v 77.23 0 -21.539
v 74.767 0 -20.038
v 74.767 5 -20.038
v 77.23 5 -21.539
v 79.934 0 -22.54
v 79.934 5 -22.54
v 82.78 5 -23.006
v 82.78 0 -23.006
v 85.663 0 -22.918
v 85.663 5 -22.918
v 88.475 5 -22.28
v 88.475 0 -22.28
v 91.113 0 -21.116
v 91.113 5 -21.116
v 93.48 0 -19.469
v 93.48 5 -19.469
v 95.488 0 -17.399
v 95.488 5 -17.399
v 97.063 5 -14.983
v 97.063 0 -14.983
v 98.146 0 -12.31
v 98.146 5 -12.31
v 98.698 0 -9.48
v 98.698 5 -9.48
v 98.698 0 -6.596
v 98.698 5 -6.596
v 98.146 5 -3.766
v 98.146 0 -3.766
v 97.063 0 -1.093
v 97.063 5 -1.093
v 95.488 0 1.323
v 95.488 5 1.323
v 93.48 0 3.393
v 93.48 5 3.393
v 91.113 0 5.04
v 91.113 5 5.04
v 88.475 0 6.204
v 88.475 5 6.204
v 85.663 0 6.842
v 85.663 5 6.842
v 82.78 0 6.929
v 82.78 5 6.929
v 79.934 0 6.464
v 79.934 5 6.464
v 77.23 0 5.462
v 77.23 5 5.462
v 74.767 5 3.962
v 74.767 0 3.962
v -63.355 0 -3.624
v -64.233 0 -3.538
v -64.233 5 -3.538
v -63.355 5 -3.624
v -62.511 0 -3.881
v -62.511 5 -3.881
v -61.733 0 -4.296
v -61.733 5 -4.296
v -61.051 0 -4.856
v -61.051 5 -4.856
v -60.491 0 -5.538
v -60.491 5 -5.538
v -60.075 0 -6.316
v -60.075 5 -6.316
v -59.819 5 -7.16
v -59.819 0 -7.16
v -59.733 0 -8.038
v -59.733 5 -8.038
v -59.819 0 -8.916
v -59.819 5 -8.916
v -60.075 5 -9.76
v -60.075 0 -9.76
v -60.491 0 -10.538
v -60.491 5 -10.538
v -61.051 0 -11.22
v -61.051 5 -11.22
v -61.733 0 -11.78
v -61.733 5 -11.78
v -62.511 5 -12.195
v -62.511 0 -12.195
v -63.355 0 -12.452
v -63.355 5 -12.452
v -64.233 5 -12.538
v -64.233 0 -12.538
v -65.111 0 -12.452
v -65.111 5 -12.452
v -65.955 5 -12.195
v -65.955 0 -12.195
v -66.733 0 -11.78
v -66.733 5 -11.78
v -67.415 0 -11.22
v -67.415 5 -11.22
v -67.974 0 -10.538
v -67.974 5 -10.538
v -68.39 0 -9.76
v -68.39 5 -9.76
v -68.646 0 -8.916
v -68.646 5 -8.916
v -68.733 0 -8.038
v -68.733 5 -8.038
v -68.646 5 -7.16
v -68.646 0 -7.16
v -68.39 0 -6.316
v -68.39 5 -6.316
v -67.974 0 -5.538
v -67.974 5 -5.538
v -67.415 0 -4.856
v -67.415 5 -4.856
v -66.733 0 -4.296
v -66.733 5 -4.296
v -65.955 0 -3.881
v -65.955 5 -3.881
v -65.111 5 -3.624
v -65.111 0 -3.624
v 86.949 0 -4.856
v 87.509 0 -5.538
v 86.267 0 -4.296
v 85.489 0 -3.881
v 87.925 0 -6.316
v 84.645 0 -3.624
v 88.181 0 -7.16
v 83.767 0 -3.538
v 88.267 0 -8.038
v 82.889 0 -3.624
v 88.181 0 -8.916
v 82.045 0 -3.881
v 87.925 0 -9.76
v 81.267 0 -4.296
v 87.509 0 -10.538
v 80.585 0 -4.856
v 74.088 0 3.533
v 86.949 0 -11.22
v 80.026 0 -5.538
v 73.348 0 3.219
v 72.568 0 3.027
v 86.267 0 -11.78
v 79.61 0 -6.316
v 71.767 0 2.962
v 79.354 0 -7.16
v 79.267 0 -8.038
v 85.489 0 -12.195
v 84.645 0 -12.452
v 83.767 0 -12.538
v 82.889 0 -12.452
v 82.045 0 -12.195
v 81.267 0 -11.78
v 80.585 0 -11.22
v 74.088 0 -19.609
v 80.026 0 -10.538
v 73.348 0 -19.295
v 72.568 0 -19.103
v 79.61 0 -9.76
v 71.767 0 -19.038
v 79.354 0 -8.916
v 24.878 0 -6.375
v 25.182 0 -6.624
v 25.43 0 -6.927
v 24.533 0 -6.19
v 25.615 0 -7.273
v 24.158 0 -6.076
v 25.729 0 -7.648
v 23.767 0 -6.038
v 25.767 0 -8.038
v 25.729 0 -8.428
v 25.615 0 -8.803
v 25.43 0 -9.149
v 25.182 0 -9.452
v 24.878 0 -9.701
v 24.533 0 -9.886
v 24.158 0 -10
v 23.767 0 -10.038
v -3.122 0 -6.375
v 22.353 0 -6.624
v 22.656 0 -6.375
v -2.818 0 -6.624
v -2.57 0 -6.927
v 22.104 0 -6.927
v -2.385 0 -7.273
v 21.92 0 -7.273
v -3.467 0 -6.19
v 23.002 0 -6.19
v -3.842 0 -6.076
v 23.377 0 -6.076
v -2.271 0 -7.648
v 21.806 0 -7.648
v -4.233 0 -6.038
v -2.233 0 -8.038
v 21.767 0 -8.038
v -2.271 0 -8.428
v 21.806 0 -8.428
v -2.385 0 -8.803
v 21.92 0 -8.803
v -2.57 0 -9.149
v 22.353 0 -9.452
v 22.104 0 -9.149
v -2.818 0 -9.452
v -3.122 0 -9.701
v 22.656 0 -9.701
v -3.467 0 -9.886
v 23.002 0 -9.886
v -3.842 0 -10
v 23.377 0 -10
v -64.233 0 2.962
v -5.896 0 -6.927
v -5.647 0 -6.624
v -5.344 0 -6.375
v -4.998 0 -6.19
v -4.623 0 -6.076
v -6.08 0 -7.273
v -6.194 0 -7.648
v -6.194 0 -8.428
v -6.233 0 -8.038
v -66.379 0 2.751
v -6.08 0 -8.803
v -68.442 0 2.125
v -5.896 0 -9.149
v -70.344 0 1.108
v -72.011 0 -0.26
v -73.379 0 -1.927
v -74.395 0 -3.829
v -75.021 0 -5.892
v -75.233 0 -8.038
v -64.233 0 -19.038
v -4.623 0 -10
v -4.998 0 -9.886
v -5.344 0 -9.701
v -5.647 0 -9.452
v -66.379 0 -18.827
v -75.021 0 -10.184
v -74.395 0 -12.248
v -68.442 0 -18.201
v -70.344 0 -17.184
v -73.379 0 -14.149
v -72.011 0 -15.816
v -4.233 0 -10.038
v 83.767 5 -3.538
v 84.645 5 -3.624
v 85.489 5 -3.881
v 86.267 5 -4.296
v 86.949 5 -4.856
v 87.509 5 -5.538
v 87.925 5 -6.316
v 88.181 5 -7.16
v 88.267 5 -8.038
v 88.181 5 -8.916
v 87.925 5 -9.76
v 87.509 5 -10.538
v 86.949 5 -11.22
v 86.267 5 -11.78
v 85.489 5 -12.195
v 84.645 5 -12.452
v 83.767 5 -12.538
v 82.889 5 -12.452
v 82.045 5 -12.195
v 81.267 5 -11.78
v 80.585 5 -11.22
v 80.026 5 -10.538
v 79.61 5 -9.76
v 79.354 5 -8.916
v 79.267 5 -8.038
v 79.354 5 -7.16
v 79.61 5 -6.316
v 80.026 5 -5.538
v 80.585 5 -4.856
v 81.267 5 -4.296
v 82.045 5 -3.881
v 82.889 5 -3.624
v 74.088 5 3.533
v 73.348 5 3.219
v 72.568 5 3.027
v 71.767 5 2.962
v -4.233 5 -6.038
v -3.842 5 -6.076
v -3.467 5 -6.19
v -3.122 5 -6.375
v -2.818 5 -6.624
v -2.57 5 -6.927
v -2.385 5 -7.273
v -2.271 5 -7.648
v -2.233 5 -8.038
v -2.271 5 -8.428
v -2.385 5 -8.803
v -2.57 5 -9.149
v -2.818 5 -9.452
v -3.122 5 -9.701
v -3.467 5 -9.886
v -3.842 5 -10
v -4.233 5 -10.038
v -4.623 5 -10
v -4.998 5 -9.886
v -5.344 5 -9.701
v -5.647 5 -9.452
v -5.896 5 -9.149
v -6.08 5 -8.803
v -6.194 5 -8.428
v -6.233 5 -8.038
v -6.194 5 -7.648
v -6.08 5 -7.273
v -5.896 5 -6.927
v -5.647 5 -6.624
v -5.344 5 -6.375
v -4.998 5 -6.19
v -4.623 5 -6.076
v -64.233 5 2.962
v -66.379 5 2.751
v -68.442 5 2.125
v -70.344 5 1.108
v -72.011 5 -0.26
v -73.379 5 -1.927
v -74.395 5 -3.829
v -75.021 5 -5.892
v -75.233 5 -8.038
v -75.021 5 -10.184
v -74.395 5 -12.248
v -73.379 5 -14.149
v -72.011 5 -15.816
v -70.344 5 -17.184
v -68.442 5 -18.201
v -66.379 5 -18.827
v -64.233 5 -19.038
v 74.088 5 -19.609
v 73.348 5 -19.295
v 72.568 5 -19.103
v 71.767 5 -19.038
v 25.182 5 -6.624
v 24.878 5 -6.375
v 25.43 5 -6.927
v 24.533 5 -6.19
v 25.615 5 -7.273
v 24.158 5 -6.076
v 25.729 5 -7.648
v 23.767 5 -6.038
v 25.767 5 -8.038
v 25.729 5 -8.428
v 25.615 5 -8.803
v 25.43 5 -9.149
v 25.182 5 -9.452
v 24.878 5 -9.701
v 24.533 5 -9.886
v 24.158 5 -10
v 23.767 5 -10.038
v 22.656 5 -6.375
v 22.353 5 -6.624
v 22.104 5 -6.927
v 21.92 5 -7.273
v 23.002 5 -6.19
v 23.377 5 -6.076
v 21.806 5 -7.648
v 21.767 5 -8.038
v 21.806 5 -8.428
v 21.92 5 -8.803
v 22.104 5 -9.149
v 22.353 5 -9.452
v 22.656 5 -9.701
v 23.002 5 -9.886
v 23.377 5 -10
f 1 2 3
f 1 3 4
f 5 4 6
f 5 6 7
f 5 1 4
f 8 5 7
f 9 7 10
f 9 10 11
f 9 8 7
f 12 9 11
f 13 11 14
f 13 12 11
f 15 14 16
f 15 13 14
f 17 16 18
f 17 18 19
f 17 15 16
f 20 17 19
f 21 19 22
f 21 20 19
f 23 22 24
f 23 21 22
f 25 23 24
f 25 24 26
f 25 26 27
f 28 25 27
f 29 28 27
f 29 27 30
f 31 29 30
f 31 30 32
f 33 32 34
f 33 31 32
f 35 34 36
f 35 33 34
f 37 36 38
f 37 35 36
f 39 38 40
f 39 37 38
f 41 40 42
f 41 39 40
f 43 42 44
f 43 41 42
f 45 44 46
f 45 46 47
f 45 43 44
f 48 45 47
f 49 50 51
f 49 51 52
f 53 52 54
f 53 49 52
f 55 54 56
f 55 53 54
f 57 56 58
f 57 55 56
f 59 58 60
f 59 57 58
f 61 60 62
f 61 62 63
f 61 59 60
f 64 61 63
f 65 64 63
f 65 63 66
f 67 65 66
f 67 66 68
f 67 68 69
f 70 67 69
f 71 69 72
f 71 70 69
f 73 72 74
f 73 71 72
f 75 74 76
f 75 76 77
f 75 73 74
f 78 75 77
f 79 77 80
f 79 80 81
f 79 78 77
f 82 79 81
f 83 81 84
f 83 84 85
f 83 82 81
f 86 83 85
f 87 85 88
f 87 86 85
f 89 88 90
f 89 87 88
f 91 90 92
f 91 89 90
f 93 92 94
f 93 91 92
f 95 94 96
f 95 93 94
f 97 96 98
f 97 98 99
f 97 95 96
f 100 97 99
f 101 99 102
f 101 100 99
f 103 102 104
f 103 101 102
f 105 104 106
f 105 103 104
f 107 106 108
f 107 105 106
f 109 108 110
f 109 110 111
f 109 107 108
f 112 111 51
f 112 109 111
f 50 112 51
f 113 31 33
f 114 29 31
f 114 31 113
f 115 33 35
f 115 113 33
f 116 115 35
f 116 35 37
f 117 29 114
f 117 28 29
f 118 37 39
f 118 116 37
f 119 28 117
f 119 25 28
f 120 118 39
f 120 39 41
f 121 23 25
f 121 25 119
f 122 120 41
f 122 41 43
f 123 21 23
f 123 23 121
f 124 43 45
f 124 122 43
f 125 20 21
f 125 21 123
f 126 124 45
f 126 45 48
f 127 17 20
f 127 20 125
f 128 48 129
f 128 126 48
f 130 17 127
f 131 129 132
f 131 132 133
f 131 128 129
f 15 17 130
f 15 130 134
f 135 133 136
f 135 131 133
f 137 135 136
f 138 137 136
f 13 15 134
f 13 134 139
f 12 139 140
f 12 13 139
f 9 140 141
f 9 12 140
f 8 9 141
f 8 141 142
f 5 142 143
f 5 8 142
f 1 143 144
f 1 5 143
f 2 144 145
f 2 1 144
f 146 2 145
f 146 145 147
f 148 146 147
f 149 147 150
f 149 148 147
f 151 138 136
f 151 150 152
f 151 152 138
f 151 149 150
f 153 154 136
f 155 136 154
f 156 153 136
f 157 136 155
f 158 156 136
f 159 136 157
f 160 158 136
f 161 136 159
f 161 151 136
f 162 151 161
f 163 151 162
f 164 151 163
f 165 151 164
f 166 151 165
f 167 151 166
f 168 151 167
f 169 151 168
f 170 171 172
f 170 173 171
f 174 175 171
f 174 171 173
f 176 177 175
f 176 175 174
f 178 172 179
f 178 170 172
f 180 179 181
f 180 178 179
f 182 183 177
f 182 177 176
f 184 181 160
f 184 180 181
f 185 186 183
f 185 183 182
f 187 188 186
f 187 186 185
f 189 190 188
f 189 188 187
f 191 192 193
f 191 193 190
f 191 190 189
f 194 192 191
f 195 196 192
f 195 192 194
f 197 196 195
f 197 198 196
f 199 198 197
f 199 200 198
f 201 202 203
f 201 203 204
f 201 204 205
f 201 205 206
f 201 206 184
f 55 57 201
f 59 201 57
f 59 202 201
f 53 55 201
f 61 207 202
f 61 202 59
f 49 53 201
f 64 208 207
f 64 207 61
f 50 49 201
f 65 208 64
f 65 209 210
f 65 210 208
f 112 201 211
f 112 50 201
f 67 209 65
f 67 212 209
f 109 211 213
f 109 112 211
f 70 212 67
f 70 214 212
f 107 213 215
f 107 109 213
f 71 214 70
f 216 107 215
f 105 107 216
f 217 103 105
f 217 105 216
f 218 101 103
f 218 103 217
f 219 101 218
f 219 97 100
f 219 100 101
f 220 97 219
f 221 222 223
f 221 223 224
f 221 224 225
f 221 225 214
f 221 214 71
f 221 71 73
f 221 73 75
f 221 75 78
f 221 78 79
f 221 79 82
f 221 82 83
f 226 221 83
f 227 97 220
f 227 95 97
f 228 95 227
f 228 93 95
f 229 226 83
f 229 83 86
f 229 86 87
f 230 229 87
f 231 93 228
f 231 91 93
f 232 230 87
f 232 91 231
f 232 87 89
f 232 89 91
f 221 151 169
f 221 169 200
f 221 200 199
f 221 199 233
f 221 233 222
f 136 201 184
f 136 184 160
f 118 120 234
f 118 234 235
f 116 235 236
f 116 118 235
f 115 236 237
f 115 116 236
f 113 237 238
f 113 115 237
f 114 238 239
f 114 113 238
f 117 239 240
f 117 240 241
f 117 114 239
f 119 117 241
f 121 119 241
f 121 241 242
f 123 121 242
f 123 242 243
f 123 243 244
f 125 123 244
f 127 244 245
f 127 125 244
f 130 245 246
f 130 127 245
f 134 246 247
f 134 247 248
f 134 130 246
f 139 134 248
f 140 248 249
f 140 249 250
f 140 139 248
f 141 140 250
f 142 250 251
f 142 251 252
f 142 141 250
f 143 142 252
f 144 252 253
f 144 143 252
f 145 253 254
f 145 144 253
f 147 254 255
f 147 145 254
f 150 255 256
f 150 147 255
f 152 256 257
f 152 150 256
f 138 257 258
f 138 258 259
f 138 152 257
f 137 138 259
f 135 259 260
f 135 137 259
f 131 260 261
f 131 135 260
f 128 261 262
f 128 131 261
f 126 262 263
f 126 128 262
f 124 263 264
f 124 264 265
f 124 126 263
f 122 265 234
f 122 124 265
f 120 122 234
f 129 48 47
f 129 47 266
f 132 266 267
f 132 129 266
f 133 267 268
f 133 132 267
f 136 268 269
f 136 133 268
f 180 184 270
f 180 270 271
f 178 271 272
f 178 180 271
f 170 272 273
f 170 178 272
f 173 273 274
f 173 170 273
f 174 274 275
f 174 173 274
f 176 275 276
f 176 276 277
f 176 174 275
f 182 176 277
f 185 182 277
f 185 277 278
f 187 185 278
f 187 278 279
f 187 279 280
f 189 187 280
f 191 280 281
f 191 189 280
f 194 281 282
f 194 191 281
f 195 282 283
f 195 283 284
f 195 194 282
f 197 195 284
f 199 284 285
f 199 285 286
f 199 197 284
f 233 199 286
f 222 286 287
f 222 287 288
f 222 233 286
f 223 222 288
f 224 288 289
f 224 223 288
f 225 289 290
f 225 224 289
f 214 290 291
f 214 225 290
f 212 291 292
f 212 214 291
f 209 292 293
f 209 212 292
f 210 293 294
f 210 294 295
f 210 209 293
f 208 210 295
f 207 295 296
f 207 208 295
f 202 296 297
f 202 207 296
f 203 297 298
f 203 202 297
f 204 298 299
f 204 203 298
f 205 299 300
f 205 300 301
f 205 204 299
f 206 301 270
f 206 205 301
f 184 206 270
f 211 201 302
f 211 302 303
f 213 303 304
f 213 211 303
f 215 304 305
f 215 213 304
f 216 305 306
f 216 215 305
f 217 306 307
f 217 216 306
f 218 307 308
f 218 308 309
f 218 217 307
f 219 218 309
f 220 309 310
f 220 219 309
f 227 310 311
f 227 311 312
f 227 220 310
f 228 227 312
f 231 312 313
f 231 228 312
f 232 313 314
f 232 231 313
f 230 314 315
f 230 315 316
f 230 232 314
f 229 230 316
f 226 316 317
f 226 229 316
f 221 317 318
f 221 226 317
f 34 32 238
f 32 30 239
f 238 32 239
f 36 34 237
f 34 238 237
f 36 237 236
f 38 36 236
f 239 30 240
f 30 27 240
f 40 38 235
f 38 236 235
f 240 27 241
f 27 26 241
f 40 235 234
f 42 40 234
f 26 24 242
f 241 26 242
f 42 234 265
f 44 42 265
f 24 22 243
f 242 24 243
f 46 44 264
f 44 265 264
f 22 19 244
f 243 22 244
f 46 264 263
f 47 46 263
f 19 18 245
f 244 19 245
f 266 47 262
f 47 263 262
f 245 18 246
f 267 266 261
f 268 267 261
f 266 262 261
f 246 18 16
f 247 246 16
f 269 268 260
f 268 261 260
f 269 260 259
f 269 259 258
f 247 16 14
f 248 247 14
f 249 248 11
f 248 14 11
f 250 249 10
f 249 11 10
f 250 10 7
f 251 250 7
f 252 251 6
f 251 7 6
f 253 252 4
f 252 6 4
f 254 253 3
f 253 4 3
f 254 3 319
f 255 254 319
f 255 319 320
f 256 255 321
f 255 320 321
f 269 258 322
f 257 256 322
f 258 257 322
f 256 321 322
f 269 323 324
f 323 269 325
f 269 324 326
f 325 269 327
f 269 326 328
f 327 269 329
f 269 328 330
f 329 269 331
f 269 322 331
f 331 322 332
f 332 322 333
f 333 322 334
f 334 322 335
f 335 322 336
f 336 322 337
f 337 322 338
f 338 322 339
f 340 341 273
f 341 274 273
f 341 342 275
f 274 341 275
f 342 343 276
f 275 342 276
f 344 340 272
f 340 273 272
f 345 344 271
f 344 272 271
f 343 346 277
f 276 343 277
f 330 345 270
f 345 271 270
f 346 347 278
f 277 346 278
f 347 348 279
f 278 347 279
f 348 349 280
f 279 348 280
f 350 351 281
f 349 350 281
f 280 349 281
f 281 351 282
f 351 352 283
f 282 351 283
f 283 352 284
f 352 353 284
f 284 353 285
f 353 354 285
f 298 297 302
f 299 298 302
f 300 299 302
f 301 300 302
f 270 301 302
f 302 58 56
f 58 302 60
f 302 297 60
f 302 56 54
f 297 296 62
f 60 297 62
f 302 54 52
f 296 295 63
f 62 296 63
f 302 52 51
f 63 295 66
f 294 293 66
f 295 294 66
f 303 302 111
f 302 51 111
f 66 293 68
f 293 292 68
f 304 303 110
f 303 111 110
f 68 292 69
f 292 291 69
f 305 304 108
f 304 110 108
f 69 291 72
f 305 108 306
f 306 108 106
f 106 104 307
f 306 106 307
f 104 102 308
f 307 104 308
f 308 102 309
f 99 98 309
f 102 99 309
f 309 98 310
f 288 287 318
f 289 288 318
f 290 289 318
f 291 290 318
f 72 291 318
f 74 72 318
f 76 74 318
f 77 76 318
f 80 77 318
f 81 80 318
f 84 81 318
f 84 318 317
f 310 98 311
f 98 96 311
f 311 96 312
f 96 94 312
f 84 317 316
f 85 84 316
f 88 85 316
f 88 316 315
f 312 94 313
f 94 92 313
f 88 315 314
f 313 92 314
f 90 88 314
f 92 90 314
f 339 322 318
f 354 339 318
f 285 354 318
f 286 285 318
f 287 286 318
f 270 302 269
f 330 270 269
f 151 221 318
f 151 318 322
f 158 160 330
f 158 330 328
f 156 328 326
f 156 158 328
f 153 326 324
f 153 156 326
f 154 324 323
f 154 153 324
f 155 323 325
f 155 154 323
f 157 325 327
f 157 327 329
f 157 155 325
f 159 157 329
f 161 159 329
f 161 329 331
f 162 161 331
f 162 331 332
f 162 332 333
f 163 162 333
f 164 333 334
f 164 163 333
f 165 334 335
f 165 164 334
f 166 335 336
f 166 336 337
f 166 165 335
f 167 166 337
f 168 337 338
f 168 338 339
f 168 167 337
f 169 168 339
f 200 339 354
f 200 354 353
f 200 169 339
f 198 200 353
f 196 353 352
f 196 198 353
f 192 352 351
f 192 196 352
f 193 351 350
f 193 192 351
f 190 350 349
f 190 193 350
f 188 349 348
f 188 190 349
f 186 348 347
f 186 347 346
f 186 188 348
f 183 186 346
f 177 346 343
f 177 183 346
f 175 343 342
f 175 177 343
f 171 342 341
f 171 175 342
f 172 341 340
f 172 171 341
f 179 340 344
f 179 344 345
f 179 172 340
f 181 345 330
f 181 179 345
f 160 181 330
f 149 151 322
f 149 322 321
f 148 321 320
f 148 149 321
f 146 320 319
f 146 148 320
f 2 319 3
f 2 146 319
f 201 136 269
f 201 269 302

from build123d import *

# Parameters (mm, degrees)
SKETCH_1_R      = 4.5
SKETCH_1_R_2    = 2
EXTRUDE_1_DEPTH = 5


with BuildPart() as part:
    # 草图1 → 凸台-拉伸1 (new body)
    with BuildSketch(Plane(origin=(0, 0, 0), x_dir=(1, 0, 0), z_dir=(0, 1, 0))):
        with BuildLine():
            Line((-64.232662192, 19.03803132), (71.767337808, 19.03803132))
            ThreePointArc((71.767337808, 19.03803132), (73.348476638, 19.29461483), (74.767337808, 20.03803132))
            ThreePointArc((74.767337808, 20.03803132), (98.767337808, 8.03803132), (74.767337808, -3.96196868))
            ThreePointArc((74.767337808, -3.96196868), (73.348476638, -3.21855219), (71.767337808, -2.96196868))
            Line((71.767337808, -2.96196868), (-64.232662192, -2.96196868))
            ThreePointArc((-64.232662192, -2.96196868), (-75.232662192, 8.03803132), (-64.232662192, 19.03803132))
        make_face()
        with Locations(Location((-64.232662192, 8.03803132, 0), (0, 0, 270))):
            Circle(SKETCH_1_R, mode=Mode.SUBTRACT)
        with Locations(Location((83.767337808, 8.03803132, 0), (0, 0, 270))):
            Circle(SKETCH_1_R, mode=Mode.SUBTRACT)
        with Locations(Location((-4.232662192, 8.03803132, 0), (0, 0, 270))):
            Circle(SKETCH_1_R_2, mode=Mode.SUBTRACT)
        with Locations(Location((23.767337808, 8.03803132, 0), (0, 0, 270))):
            Circle(SKETCH_1_R_2, mode=Mode.SUBTRACT)
    extrude(amount=EXTRUDE_1_DEPTH)


solid = part.part
